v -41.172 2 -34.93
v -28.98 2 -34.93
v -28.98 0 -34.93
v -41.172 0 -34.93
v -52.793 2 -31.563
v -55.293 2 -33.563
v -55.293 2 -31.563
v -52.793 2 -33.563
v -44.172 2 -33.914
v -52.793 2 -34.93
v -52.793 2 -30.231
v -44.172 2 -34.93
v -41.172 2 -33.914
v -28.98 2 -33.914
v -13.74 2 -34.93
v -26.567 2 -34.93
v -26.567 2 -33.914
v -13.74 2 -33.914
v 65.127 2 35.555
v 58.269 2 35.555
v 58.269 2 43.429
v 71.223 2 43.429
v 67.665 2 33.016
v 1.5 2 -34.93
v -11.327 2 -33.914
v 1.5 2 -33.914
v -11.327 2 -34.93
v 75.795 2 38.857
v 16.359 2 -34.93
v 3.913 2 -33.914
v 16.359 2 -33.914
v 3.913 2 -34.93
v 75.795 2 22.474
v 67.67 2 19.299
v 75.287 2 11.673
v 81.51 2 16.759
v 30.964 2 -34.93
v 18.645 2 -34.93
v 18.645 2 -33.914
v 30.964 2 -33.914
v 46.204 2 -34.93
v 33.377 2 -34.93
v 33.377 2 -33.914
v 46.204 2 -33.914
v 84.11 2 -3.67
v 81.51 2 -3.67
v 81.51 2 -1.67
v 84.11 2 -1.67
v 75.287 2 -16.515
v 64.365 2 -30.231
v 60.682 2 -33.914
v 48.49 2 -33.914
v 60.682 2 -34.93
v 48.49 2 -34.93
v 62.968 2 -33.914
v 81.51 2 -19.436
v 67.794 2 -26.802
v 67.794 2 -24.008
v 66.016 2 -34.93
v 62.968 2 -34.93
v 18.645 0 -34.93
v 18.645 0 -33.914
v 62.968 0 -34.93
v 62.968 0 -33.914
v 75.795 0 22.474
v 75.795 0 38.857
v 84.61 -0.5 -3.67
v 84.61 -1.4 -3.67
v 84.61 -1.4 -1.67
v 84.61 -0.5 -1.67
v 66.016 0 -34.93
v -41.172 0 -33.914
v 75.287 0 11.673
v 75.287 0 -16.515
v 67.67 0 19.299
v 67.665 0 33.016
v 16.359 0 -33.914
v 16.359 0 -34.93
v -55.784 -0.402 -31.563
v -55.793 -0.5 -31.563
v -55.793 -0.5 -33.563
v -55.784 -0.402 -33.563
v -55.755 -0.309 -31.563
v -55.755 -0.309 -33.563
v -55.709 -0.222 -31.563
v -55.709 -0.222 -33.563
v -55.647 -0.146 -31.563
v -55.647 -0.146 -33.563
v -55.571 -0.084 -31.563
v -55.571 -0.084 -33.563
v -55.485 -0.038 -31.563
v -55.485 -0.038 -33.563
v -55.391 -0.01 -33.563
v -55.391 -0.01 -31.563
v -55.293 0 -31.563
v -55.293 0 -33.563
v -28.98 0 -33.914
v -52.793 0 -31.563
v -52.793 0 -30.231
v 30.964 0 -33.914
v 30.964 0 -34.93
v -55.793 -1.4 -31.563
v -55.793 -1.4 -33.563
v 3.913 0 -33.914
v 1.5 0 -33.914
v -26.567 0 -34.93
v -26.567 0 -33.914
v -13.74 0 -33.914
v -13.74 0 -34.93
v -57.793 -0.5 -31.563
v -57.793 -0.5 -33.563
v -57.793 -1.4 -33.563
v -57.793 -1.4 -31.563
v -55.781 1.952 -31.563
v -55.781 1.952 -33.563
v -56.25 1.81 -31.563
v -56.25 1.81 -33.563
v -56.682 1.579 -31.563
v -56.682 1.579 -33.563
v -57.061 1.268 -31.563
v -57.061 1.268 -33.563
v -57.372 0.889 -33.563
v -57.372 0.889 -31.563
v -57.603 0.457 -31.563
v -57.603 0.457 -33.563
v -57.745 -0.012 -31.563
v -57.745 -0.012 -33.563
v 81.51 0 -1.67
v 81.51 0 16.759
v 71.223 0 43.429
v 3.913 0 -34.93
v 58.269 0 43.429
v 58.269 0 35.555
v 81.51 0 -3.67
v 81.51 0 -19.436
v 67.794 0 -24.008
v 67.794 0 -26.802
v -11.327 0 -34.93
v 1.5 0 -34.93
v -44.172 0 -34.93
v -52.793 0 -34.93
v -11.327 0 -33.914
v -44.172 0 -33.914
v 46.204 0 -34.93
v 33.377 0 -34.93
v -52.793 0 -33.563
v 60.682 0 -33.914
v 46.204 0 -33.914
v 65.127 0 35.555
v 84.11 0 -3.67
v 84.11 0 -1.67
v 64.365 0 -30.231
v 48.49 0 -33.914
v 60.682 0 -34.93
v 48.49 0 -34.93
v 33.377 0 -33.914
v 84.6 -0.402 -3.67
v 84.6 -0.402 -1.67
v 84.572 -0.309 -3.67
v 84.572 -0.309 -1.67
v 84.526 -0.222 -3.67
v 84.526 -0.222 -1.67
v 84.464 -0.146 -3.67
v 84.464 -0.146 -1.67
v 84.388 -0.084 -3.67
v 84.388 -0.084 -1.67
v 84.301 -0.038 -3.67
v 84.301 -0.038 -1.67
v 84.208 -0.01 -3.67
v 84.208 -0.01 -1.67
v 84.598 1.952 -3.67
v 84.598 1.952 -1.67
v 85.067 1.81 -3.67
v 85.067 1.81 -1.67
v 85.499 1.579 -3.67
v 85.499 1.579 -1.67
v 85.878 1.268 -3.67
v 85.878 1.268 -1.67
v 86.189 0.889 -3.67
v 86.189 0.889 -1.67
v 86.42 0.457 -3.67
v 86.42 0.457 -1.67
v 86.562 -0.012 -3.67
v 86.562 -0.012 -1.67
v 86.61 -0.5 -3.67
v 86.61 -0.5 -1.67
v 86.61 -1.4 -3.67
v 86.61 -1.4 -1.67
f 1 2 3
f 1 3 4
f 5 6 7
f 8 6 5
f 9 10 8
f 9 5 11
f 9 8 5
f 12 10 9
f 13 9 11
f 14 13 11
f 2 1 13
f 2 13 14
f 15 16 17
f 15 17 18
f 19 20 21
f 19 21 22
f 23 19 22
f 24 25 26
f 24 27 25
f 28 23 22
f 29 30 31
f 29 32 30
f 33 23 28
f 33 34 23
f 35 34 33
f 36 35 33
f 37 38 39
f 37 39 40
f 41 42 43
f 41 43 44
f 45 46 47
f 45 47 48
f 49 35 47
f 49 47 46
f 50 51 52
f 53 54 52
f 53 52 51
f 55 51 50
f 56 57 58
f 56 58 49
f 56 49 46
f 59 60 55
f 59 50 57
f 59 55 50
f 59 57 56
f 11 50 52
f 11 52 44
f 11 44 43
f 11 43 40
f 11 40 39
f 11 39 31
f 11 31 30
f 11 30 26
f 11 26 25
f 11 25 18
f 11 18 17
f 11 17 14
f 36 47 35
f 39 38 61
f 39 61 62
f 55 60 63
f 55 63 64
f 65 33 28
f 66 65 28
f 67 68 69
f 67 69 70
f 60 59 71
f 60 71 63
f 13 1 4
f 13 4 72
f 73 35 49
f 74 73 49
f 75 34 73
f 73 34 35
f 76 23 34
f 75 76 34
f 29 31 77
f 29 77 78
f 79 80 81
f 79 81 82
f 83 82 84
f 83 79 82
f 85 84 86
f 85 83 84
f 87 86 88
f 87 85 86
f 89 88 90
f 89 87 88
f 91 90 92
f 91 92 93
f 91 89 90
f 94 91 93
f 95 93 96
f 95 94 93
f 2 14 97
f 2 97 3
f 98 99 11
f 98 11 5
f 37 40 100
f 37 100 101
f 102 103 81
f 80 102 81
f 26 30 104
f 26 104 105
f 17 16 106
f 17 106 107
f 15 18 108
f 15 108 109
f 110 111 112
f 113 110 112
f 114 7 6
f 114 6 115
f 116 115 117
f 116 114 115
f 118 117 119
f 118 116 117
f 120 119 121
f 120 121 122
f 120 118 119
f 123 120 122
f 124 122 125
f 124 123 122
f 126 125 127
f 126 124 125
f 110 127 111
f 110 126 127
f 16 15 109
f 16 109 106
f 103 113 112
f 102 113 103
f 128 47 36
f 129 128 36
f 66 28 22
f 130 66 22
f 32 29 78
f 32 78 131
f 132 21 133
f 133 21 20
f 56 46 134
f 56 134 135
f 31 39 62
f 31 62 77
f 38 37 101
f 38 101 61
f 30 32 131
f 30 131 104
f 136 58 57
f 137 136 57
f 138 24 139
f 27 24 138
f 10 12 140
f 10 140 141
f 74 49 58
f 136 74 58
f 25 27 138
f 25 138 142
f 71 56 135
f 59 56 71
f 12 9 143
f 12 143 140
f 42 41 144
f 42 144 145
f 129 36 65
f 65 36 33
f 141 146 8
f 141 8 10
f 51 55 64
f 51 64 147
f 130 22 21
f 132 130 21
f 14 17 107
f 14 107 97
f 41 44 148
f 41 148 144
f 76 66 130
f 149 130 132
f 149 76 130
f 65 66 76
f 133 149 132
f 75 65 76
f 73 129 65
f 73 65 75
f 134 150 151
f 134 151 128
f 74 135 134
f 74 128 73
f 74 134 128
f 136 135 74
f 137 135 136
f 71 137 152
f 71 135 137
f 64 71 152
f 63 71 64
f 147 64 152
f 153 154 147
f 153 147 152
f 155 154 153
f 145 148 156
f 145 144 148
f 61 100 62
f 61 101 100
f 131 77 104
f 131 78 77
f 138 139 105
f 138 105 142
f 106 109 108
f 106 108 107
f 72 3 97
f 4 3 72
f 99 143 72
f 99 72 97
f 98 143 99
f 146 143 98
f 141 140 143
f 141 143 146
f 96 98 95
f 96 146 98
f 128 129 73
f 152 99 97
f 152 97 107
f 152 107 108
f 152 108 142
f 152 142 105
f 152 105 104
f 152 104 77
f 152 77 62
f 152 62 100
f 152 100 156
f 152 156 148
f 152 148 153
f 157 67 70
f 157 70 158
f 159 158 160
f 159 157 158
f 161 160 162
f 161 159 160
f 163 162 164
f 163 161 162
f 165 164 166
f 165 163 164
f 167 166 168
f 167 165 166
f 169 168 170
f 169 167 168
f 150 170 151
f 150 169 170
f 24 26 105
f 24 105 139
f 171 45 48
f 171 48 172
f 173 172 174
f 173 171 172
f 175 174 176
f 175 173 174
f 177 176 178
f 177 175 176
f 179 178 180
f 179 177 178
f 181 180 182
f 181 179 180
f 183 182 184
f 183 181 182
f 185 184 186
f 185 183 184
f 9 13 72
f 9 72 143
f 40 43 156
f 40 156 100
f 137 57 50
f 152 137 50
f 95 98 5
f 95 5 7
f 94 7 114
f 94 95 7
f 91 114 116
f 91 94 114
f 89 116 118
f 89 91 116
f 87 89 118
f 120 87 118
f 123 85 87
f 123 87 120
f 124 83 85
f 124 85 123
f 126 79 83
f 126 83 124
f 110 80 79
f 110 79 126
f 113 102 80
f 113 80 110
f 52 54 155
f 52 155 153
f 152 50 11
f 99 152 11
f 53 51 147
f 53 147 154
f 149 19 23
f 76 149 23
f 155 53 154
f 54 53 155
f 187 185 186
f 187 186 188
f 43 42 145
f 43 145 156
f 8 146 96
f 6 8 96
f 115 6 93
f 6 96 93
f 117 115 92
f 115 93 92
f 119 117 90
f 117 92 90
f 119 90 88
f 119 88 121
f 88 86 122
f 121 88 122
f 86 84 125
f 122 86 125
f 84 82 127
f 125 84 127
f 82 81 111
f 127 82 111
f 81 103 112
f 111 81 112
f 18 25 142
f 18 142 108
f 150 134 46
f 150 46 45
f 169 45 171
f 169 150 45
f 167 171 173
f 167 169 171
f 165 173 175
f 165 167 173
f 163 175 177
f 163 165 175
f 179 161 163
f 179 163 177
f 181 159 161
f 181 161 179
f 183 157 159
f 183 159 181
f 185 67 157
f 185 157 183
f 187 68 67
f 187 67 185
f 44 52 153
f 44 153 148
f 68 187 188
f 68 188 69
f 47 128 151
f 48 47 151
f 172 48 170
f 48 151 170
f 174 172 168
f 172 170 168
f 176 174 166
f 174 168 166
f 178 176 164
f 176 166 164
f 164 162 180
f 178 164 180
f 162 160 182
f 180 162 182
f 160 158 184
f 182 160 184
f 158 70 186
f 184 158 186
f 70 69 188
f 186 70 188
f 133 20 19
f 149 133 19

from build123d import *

# Parameters (mm, degrees)
BOSS_EXTRUDE1_DEPTH = 2
EDGE_FLANGE1_DEPTH  = 2
EDGE_FLANGE2_DEPTH  = 2
CUT_EXTRUDE3_DEPTH  = 10


# Sheet-metal steps are written as plain solids
with BuildPart() as part:
    # Sketch2 → Boss-Extrude1 (new body)
    with BuildSketch(Plane(origin=(0, 0, 0), x_dir=(1, 0, 0), z_dir=(0, 1, 0))):
        Polygon((81.609993248, 1.669814581), (81.609993248, -16.836643227), (75.909994488, -22.536641987), (75.909994488, -38.936642207), (70.009993588, -44.836643107), (58.109994528, -44.836643107), (58.109994528, -34.336641247), (63.809993288, -34.336641247), (67.509993508, -30.636641027), (67.509993508, -19.345596807), (75.109993548, -11.745596767), (75.109993548, 16.463358753), (67.709993108, 23.863356653), (67.709993108, 26.763358473), (64.309994828, 30.163356753), (-43.190006072, 30.163356753), (-52.793309772, 30.163356753), (-52.793309772, 31.563357033), (-54.793309772, 31.563357033), (-54.793309772, 33.563357033), (-52.793309772, 33.563357033), (-52.793309772, 34.963357313), (-43.190006072, 34.963357313), (66.209993568, 34.963357313), (81.609993248, 19.563357633), (81.609993248, 3.669814581), (83.609993248, 3.669814581), (83.609993248, 1.669814581), align=None)
    extrude(amount=BOSS_EXTRUDE1_DEPTH)

    # Edge-Flange1 section (across the edge) → Edge-Flange1 (add)
    with BuildSketch(Plane(origin=(-55.793309772, 0, -31.563357033), x_dir=(1, 0, 0), z_dir=(0, 0, -1))):
        with BuildLine():
            Line((-2, 0.5), (-2, 1.4))
            Line((-2, 1.4), (0, 1.4))
            Line((0, 1.4), (0, 0.5))
            ThreePointArc((0, 0.5), (0.146446609, 0.146446609), (0.5, 0))
            Line((0.5, 0), (1, 0))
            Line((1, 0), (1, -2))
            Line((1, -2), (0.5, -2))
            ThreePointArc((0.5, -2), (-1.267766953, -1.267766953), (-2, 0.5))
        make_face()
    extrude(amount=EDGE_FLANGE1_DEPTH)

    # Edge-Flange2 section (across the edge) → Edge-Flange2 (add)
    with BuildSketch(Plane(origin=(84.609993248, 0, -3.669814581), x_dir=(-1, 0, 0), z_dir=(0, 0, 1))):
        with BuildLine():
            Line((-2, 0.5), (-2, 1.4))
            Line((-2, 1.4), (0, 1.4))
            Line((0, 1.4), (0, 0.5))
            ThreePointArc((0, 0.5), (0.146446609, 0.146446609), (0.5, 0))
            Line((0.5, 0), (1, 0))
            Line((1, 0), (1, -2))
            Line((1, -2), (0.5, -2))
            ThreePointArc((0.5, -2), (-1.267766953, -1.267766953), (-2, 0.5))
        make_face()
    extrude(amount=EDGE_FLANGE2_DEPTH)

    # Sketch13 → Cut-Extrude3 (cut)
    with BuildSketch(Plane(origin=(0, 2, 0), x_dir=(1, 0, 0), z_dir=(0, 1, 0))):
        Polygon((64.364993832, 30.231358373), (-43.077006168, 30.231358373), (-52.793309772, 30.231358373), (-52.793309772, 30.163356753), (64.309994828, 30.163356753), (67.709993108, 26.763358473), (67.709993108, 23.863356653), (75.109993548, 16.463358753), (75.109993548, -11.745596767), (67.509993508, -19.345596807), (67.509993508, -30.636641027), (63.809993288, -34.336641247), (58.109994528, -34.336641247), (58.109994528, -44.836643107), (70.009993588, -44.836643107), (75.909994488, -38.936642207), (75.909994488, -22.536641987), (81.609993248, -16.836643227), (81.609993248, 1.669814581), (81.509993832, 1.669814581), (81.509993832, -16.758641627), (75.794993832, -22.473641627), (75.794993832, -38.856641627), (71.222993832, -43.428641627), (58.268993832, -43.428641627), (58.268993832, -35.554641627), (65.126993832, -35.554641627), (67.665284412, -33.016351047), (67.669899592, -19.298575587), (75.286993832, -11.672504987), (75.286993832, 16.515358373), (67.793993832, 24.008355833), (67.793993832, 26.802358373), align=None)
        Polygon((-52.793309772, 30.163356753), (-52.793309772, 30.231358373), (-53.09278865, 30.231358373), (-53.09278865, 29.122247983), (64.073173088, 29.122247983), (66.904295046, 26.802358373), (66.904295046, 23.685270997), (74.890508664, 15.670381273), (73.855495628, -9.951608799), (66.571415804, -17.811521066), (66.392045366, -24.291741654), (65.126993832, -32.125935595), (57.650093481, -33.249786732), (57.276841603, -46.73447534), (58.268993832, -46.73447534), (69.513593476, -46.73447534), (76.944541222, -41.148796497), (77.641700893, -23.890445583), (84.109993248, -17.212504202), (84.109993248, 1.669814581), (81.609993248, 1.669814581), (81.609993248, -16.836643227), (75.909994488, -22.536641987), (75.909994488, -38.936642207), (70.009993588, -44.836643107), (58.109994528, -44.836643107), (58.109994528, -34.336641247), (63.809993288, -34.336641247), (67.509993508, -30.636641027), (67.509993508, -19.345596807), (75.109993548, -11.745596767), (75.109993548, 16.463358753), (67.709993108, 23.863356653), (67.709993108, 26.763358473), (64.309994828, 30.163356753), align=None)
        Polygon((84.109993248, 19.032357692), (84.109993248, 3.669814581), (81.509993832, 3.669814581), (81.509993832, 19.436358373), (66.015993832, 34.930358373), (62.967993832, 34.930358373), (62.967993832, 33.914358373), (60.681993832, 33.914358373), (60.681993832, 34.930358373), (48.489993832, 34.930358373), (48.489993832, 33.914358373), (46.203993832, 33.914358373), (46.203993832, 34.930358373), (33.376993832, 34.930358373), (33.376993832, 33.914358373), (30.963993832, 33.914358373), (30.963993832, 34.930358373), (18.644993832, 34.930358373), (18.644993832, 33.914358373), (16.358993832, 33.914358373), (16.358993832, 34.930358373), (3.912993832, 34.930358373), (3.912993832, 33.914358373), (1.499993832, 33.914358373), (1.499993832, 34.930358373), (-11.327006168, 34.930358373), (-11.327006168, 33.914358373), (-13.740006168, 33.914358373), (-13.740006168, 34.930358373), (-26.567006168, 34.930358373), (-26.567006168, 33.914358373), (-28.980006168, 33.914358373), (-28.980006168, 34.930358373), (-41.172006168, 34.930358373), (-41.172006168, 33.914358373), (-44.172006168, 33.914358373), (-44.172006168, 34.930358373), (-54.307784522, 34.930358373), (-54.307784522, 35.697895733), (66.904295046, 35.697895733), align=None)
    extrude(amount=-CUT_EXTRUDE3_DEPTH, mode=Mode.SUBTRACT)


solid = part.part
